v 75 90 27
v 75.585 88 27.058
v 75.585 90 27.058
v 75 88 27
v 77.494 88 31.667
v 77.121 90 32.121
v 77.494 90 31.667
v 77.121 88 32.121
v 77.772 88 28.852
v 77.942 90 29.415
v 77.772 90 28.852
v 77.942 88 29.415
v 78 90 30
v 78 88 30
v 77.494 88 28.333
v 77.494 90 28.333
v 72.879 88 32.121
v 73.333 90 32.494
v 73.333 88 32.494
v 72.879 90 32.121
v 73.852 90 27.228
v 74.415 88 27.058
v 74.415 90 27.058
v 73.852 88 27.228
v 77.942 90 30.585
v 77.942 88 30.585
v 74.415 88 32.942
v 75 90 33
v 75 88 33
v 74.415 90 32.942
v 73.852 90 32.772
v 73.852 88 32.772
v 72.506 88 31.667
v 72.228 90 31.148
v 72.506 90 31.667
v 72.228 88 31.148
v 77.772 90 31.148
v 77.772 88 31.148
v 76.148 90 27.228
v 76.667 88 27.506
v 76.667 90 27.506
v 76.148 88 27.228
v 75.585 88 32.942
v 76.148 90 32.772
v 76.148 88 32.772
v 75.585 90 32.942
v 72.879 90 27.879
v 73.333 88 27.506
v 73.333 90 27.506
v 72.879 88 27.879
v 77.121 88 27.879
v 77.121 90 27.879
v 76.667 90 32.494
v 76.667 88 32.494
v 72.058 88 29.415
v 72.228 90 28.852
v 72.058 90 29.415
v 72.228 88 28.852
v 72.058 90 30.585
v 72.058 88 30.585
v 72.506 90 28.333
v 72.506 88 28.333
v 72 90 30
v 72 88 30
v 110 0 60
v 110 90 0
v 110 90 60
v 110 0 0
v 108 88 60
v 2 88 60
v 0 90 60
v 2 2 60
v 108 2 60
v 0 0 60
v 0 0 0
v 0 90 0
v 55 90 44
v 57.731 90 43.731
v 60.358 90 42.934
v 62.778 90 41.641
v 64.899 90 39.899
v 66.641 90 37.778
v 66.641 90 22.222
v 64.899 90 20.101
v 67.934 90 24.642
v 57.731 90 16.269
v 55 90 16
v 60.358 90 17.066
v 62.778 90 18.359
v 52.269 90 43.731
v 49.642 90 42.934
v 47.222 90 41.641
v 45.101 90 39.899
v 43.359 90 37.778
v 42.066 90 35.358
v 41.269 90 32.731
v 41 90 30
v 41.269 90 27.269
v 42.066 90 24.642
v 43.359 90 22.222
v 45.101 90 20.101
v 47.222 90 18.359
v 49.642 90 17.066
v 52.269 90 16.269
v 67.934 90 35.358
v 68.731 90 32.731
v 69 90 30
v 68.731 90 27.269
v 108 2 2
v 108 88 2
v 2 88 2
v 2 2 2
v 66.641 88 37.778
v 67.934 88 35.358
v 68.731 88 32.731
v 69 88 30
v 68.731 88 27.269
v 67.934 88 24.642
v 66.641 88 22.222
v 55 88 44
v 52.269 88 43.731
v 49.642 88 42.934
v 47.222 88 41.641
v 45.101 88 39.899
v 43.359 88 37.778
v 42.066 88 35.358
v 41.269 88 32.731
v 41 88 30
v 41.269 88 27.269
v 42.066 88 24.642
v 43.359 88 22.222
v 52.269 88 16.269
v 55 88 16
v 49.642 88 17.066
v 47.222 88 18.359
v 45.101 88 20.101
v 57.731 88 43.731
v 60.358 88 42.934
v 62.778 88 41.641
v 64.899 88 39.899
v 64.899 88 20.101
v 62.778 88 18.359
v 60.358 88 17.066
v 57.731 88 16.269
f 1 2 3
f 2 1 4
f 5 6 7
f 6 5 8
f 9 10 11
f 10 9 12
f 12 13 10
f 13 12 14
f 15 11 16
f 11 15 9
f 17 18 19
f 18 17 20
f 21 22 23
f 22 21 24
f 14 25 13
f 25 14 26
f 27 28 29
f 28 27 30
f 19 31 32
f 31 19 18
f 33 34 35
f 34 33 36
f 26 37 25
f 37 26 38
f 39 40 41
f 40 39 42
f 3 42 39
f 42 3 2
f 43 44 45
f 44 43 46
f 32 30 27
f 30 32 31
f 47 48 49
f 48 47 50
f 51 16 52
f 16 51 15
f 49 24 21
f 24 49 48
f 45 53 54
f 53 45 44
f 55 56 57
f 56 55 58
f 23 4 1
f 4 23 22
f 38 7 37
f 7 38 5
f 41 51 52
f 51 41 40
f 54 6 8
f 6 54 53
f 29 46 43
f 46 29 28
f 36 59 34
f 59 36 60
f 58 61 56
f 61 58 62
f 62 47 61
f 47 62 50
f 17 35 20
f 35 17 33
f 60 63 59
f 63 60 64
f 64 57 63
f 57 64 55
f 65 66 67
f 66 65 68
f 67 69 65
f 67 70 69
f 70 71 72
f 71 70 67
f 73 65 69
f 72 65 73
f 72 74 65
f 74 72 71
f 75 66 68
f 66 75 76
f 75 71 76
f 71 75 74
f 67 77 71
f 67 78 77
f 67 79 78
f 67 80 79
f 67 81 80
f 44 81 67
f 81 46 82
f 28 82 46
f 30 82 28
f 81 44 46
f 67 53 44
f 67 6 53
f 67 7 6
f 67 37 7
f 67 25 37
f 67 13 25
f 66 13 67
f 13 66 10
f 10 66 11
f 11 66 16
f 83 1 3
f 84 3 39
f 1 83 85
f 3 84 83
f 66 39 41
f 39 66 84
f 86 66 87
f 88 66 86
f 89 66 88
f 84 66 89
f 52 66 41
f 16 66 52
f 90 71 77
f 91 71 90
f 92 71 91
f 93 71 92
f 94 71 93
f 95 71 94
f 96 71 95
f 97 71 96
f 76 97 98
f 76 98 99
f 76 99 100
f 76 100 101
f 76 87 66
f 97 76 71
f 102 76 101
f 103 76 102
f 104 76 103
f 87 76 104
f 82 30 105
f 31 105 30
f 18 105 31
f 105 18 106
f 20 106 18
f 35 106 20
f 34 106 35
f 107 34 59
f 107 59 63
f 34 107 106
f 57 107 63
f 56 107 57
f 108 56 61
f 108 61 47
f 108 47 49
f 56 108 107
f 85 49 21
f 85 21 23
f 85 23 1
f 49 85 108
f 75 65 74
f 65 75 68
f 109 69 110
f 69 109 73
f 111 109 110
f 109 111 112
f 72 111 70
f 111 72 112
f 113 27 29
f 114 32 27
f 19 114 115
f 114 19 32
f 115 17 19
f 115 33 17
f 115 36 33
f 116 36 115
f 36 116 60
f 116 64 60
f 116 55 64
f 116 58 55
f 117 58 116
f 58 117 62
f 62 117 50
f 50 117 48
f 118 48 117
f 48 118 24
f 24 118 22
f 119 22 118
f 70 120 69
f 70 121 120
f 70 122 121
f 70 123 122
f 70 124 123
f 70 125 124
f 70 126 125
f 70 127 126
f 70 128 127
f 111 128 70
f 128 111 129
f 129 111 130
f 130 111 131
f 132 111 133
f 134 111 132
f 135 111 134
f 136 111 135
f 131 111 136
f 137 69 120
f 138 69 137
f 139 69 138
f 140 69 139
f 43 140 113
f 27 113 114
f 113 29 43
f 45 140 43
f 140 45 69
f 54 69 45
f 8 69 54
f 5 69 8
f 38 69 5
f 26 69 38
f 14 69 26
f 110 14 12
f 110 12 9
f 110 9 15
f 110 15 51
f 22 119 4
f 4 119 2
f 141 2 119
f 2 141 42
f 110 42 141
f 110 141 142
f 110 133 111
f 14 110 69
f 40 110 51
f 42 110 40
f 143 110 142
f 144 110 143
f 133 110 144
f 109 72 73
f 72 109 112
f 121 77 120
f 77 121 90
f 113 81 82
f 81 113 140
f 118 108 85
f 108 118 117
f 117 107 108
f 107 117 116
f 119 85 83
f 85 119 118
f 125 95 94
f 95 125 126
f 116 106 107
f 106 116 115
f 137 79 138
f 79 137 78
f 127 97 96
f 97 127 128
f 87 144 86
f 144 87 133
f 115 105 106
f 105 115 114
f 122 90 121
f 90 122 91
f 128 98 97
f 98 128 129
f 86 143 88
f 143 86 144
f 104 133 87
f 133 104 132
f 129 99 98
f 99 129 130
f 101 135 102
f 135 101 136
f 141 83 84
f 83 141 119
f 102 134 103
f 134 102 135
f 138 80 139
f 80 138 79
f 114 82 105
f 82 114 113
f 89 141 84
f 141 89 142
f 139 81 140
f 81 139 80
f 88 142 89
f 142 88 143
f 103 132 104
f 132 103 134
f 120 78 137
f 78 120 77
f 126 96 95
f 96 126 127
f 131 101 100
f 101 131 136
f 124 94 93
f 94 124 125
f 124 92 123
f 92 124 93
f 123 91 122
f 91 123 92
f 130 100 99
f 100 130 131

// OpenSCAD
$fn = 32;

// ----------------------------------------------------------------------
// Vent box: roundvent enclosure
// ----------------------------------------------------------------------

// --- parameters (mm) ---
box_l = 110;              // box length, X
box_w = 90;               // box width, Y
box_h = 60;               // box height, Z
wall_t = 2;               // shell wall thickness
vent_d = 28;              // central vent diameter
ring_d = 6;               // ring hole diameter
n_ring = 6;               // holes in the ring
ring_r = 20;              // ring radius

ring_step = 360 / n_ring;  // ring hole angular step

difference() {
  cube([box_l, box_w, box_h]);
  translate([wall_t, wall_t, wall_t])
    cube([box_l - 2 * wall_t, box_w - 2 * wall_t, box_h]);
  translate([box_l / 2, box_w - wall_t - 1, box_h / 2])
    rotate([-90, 0, 0]) cylinder(h = wall_t + 2, d = vent_d);
  for (i = [0 : n_ring - 1])
    translate([box_l / 2, box_w - wall_t - 1, box_h / 2])
      rotate([0, 0, i * ring_step])
        translate([ring_r, 0, 0]) rotate([-90, 0, 0])
          cylinder(h = wall_t + 2, d = ring_d);
}
